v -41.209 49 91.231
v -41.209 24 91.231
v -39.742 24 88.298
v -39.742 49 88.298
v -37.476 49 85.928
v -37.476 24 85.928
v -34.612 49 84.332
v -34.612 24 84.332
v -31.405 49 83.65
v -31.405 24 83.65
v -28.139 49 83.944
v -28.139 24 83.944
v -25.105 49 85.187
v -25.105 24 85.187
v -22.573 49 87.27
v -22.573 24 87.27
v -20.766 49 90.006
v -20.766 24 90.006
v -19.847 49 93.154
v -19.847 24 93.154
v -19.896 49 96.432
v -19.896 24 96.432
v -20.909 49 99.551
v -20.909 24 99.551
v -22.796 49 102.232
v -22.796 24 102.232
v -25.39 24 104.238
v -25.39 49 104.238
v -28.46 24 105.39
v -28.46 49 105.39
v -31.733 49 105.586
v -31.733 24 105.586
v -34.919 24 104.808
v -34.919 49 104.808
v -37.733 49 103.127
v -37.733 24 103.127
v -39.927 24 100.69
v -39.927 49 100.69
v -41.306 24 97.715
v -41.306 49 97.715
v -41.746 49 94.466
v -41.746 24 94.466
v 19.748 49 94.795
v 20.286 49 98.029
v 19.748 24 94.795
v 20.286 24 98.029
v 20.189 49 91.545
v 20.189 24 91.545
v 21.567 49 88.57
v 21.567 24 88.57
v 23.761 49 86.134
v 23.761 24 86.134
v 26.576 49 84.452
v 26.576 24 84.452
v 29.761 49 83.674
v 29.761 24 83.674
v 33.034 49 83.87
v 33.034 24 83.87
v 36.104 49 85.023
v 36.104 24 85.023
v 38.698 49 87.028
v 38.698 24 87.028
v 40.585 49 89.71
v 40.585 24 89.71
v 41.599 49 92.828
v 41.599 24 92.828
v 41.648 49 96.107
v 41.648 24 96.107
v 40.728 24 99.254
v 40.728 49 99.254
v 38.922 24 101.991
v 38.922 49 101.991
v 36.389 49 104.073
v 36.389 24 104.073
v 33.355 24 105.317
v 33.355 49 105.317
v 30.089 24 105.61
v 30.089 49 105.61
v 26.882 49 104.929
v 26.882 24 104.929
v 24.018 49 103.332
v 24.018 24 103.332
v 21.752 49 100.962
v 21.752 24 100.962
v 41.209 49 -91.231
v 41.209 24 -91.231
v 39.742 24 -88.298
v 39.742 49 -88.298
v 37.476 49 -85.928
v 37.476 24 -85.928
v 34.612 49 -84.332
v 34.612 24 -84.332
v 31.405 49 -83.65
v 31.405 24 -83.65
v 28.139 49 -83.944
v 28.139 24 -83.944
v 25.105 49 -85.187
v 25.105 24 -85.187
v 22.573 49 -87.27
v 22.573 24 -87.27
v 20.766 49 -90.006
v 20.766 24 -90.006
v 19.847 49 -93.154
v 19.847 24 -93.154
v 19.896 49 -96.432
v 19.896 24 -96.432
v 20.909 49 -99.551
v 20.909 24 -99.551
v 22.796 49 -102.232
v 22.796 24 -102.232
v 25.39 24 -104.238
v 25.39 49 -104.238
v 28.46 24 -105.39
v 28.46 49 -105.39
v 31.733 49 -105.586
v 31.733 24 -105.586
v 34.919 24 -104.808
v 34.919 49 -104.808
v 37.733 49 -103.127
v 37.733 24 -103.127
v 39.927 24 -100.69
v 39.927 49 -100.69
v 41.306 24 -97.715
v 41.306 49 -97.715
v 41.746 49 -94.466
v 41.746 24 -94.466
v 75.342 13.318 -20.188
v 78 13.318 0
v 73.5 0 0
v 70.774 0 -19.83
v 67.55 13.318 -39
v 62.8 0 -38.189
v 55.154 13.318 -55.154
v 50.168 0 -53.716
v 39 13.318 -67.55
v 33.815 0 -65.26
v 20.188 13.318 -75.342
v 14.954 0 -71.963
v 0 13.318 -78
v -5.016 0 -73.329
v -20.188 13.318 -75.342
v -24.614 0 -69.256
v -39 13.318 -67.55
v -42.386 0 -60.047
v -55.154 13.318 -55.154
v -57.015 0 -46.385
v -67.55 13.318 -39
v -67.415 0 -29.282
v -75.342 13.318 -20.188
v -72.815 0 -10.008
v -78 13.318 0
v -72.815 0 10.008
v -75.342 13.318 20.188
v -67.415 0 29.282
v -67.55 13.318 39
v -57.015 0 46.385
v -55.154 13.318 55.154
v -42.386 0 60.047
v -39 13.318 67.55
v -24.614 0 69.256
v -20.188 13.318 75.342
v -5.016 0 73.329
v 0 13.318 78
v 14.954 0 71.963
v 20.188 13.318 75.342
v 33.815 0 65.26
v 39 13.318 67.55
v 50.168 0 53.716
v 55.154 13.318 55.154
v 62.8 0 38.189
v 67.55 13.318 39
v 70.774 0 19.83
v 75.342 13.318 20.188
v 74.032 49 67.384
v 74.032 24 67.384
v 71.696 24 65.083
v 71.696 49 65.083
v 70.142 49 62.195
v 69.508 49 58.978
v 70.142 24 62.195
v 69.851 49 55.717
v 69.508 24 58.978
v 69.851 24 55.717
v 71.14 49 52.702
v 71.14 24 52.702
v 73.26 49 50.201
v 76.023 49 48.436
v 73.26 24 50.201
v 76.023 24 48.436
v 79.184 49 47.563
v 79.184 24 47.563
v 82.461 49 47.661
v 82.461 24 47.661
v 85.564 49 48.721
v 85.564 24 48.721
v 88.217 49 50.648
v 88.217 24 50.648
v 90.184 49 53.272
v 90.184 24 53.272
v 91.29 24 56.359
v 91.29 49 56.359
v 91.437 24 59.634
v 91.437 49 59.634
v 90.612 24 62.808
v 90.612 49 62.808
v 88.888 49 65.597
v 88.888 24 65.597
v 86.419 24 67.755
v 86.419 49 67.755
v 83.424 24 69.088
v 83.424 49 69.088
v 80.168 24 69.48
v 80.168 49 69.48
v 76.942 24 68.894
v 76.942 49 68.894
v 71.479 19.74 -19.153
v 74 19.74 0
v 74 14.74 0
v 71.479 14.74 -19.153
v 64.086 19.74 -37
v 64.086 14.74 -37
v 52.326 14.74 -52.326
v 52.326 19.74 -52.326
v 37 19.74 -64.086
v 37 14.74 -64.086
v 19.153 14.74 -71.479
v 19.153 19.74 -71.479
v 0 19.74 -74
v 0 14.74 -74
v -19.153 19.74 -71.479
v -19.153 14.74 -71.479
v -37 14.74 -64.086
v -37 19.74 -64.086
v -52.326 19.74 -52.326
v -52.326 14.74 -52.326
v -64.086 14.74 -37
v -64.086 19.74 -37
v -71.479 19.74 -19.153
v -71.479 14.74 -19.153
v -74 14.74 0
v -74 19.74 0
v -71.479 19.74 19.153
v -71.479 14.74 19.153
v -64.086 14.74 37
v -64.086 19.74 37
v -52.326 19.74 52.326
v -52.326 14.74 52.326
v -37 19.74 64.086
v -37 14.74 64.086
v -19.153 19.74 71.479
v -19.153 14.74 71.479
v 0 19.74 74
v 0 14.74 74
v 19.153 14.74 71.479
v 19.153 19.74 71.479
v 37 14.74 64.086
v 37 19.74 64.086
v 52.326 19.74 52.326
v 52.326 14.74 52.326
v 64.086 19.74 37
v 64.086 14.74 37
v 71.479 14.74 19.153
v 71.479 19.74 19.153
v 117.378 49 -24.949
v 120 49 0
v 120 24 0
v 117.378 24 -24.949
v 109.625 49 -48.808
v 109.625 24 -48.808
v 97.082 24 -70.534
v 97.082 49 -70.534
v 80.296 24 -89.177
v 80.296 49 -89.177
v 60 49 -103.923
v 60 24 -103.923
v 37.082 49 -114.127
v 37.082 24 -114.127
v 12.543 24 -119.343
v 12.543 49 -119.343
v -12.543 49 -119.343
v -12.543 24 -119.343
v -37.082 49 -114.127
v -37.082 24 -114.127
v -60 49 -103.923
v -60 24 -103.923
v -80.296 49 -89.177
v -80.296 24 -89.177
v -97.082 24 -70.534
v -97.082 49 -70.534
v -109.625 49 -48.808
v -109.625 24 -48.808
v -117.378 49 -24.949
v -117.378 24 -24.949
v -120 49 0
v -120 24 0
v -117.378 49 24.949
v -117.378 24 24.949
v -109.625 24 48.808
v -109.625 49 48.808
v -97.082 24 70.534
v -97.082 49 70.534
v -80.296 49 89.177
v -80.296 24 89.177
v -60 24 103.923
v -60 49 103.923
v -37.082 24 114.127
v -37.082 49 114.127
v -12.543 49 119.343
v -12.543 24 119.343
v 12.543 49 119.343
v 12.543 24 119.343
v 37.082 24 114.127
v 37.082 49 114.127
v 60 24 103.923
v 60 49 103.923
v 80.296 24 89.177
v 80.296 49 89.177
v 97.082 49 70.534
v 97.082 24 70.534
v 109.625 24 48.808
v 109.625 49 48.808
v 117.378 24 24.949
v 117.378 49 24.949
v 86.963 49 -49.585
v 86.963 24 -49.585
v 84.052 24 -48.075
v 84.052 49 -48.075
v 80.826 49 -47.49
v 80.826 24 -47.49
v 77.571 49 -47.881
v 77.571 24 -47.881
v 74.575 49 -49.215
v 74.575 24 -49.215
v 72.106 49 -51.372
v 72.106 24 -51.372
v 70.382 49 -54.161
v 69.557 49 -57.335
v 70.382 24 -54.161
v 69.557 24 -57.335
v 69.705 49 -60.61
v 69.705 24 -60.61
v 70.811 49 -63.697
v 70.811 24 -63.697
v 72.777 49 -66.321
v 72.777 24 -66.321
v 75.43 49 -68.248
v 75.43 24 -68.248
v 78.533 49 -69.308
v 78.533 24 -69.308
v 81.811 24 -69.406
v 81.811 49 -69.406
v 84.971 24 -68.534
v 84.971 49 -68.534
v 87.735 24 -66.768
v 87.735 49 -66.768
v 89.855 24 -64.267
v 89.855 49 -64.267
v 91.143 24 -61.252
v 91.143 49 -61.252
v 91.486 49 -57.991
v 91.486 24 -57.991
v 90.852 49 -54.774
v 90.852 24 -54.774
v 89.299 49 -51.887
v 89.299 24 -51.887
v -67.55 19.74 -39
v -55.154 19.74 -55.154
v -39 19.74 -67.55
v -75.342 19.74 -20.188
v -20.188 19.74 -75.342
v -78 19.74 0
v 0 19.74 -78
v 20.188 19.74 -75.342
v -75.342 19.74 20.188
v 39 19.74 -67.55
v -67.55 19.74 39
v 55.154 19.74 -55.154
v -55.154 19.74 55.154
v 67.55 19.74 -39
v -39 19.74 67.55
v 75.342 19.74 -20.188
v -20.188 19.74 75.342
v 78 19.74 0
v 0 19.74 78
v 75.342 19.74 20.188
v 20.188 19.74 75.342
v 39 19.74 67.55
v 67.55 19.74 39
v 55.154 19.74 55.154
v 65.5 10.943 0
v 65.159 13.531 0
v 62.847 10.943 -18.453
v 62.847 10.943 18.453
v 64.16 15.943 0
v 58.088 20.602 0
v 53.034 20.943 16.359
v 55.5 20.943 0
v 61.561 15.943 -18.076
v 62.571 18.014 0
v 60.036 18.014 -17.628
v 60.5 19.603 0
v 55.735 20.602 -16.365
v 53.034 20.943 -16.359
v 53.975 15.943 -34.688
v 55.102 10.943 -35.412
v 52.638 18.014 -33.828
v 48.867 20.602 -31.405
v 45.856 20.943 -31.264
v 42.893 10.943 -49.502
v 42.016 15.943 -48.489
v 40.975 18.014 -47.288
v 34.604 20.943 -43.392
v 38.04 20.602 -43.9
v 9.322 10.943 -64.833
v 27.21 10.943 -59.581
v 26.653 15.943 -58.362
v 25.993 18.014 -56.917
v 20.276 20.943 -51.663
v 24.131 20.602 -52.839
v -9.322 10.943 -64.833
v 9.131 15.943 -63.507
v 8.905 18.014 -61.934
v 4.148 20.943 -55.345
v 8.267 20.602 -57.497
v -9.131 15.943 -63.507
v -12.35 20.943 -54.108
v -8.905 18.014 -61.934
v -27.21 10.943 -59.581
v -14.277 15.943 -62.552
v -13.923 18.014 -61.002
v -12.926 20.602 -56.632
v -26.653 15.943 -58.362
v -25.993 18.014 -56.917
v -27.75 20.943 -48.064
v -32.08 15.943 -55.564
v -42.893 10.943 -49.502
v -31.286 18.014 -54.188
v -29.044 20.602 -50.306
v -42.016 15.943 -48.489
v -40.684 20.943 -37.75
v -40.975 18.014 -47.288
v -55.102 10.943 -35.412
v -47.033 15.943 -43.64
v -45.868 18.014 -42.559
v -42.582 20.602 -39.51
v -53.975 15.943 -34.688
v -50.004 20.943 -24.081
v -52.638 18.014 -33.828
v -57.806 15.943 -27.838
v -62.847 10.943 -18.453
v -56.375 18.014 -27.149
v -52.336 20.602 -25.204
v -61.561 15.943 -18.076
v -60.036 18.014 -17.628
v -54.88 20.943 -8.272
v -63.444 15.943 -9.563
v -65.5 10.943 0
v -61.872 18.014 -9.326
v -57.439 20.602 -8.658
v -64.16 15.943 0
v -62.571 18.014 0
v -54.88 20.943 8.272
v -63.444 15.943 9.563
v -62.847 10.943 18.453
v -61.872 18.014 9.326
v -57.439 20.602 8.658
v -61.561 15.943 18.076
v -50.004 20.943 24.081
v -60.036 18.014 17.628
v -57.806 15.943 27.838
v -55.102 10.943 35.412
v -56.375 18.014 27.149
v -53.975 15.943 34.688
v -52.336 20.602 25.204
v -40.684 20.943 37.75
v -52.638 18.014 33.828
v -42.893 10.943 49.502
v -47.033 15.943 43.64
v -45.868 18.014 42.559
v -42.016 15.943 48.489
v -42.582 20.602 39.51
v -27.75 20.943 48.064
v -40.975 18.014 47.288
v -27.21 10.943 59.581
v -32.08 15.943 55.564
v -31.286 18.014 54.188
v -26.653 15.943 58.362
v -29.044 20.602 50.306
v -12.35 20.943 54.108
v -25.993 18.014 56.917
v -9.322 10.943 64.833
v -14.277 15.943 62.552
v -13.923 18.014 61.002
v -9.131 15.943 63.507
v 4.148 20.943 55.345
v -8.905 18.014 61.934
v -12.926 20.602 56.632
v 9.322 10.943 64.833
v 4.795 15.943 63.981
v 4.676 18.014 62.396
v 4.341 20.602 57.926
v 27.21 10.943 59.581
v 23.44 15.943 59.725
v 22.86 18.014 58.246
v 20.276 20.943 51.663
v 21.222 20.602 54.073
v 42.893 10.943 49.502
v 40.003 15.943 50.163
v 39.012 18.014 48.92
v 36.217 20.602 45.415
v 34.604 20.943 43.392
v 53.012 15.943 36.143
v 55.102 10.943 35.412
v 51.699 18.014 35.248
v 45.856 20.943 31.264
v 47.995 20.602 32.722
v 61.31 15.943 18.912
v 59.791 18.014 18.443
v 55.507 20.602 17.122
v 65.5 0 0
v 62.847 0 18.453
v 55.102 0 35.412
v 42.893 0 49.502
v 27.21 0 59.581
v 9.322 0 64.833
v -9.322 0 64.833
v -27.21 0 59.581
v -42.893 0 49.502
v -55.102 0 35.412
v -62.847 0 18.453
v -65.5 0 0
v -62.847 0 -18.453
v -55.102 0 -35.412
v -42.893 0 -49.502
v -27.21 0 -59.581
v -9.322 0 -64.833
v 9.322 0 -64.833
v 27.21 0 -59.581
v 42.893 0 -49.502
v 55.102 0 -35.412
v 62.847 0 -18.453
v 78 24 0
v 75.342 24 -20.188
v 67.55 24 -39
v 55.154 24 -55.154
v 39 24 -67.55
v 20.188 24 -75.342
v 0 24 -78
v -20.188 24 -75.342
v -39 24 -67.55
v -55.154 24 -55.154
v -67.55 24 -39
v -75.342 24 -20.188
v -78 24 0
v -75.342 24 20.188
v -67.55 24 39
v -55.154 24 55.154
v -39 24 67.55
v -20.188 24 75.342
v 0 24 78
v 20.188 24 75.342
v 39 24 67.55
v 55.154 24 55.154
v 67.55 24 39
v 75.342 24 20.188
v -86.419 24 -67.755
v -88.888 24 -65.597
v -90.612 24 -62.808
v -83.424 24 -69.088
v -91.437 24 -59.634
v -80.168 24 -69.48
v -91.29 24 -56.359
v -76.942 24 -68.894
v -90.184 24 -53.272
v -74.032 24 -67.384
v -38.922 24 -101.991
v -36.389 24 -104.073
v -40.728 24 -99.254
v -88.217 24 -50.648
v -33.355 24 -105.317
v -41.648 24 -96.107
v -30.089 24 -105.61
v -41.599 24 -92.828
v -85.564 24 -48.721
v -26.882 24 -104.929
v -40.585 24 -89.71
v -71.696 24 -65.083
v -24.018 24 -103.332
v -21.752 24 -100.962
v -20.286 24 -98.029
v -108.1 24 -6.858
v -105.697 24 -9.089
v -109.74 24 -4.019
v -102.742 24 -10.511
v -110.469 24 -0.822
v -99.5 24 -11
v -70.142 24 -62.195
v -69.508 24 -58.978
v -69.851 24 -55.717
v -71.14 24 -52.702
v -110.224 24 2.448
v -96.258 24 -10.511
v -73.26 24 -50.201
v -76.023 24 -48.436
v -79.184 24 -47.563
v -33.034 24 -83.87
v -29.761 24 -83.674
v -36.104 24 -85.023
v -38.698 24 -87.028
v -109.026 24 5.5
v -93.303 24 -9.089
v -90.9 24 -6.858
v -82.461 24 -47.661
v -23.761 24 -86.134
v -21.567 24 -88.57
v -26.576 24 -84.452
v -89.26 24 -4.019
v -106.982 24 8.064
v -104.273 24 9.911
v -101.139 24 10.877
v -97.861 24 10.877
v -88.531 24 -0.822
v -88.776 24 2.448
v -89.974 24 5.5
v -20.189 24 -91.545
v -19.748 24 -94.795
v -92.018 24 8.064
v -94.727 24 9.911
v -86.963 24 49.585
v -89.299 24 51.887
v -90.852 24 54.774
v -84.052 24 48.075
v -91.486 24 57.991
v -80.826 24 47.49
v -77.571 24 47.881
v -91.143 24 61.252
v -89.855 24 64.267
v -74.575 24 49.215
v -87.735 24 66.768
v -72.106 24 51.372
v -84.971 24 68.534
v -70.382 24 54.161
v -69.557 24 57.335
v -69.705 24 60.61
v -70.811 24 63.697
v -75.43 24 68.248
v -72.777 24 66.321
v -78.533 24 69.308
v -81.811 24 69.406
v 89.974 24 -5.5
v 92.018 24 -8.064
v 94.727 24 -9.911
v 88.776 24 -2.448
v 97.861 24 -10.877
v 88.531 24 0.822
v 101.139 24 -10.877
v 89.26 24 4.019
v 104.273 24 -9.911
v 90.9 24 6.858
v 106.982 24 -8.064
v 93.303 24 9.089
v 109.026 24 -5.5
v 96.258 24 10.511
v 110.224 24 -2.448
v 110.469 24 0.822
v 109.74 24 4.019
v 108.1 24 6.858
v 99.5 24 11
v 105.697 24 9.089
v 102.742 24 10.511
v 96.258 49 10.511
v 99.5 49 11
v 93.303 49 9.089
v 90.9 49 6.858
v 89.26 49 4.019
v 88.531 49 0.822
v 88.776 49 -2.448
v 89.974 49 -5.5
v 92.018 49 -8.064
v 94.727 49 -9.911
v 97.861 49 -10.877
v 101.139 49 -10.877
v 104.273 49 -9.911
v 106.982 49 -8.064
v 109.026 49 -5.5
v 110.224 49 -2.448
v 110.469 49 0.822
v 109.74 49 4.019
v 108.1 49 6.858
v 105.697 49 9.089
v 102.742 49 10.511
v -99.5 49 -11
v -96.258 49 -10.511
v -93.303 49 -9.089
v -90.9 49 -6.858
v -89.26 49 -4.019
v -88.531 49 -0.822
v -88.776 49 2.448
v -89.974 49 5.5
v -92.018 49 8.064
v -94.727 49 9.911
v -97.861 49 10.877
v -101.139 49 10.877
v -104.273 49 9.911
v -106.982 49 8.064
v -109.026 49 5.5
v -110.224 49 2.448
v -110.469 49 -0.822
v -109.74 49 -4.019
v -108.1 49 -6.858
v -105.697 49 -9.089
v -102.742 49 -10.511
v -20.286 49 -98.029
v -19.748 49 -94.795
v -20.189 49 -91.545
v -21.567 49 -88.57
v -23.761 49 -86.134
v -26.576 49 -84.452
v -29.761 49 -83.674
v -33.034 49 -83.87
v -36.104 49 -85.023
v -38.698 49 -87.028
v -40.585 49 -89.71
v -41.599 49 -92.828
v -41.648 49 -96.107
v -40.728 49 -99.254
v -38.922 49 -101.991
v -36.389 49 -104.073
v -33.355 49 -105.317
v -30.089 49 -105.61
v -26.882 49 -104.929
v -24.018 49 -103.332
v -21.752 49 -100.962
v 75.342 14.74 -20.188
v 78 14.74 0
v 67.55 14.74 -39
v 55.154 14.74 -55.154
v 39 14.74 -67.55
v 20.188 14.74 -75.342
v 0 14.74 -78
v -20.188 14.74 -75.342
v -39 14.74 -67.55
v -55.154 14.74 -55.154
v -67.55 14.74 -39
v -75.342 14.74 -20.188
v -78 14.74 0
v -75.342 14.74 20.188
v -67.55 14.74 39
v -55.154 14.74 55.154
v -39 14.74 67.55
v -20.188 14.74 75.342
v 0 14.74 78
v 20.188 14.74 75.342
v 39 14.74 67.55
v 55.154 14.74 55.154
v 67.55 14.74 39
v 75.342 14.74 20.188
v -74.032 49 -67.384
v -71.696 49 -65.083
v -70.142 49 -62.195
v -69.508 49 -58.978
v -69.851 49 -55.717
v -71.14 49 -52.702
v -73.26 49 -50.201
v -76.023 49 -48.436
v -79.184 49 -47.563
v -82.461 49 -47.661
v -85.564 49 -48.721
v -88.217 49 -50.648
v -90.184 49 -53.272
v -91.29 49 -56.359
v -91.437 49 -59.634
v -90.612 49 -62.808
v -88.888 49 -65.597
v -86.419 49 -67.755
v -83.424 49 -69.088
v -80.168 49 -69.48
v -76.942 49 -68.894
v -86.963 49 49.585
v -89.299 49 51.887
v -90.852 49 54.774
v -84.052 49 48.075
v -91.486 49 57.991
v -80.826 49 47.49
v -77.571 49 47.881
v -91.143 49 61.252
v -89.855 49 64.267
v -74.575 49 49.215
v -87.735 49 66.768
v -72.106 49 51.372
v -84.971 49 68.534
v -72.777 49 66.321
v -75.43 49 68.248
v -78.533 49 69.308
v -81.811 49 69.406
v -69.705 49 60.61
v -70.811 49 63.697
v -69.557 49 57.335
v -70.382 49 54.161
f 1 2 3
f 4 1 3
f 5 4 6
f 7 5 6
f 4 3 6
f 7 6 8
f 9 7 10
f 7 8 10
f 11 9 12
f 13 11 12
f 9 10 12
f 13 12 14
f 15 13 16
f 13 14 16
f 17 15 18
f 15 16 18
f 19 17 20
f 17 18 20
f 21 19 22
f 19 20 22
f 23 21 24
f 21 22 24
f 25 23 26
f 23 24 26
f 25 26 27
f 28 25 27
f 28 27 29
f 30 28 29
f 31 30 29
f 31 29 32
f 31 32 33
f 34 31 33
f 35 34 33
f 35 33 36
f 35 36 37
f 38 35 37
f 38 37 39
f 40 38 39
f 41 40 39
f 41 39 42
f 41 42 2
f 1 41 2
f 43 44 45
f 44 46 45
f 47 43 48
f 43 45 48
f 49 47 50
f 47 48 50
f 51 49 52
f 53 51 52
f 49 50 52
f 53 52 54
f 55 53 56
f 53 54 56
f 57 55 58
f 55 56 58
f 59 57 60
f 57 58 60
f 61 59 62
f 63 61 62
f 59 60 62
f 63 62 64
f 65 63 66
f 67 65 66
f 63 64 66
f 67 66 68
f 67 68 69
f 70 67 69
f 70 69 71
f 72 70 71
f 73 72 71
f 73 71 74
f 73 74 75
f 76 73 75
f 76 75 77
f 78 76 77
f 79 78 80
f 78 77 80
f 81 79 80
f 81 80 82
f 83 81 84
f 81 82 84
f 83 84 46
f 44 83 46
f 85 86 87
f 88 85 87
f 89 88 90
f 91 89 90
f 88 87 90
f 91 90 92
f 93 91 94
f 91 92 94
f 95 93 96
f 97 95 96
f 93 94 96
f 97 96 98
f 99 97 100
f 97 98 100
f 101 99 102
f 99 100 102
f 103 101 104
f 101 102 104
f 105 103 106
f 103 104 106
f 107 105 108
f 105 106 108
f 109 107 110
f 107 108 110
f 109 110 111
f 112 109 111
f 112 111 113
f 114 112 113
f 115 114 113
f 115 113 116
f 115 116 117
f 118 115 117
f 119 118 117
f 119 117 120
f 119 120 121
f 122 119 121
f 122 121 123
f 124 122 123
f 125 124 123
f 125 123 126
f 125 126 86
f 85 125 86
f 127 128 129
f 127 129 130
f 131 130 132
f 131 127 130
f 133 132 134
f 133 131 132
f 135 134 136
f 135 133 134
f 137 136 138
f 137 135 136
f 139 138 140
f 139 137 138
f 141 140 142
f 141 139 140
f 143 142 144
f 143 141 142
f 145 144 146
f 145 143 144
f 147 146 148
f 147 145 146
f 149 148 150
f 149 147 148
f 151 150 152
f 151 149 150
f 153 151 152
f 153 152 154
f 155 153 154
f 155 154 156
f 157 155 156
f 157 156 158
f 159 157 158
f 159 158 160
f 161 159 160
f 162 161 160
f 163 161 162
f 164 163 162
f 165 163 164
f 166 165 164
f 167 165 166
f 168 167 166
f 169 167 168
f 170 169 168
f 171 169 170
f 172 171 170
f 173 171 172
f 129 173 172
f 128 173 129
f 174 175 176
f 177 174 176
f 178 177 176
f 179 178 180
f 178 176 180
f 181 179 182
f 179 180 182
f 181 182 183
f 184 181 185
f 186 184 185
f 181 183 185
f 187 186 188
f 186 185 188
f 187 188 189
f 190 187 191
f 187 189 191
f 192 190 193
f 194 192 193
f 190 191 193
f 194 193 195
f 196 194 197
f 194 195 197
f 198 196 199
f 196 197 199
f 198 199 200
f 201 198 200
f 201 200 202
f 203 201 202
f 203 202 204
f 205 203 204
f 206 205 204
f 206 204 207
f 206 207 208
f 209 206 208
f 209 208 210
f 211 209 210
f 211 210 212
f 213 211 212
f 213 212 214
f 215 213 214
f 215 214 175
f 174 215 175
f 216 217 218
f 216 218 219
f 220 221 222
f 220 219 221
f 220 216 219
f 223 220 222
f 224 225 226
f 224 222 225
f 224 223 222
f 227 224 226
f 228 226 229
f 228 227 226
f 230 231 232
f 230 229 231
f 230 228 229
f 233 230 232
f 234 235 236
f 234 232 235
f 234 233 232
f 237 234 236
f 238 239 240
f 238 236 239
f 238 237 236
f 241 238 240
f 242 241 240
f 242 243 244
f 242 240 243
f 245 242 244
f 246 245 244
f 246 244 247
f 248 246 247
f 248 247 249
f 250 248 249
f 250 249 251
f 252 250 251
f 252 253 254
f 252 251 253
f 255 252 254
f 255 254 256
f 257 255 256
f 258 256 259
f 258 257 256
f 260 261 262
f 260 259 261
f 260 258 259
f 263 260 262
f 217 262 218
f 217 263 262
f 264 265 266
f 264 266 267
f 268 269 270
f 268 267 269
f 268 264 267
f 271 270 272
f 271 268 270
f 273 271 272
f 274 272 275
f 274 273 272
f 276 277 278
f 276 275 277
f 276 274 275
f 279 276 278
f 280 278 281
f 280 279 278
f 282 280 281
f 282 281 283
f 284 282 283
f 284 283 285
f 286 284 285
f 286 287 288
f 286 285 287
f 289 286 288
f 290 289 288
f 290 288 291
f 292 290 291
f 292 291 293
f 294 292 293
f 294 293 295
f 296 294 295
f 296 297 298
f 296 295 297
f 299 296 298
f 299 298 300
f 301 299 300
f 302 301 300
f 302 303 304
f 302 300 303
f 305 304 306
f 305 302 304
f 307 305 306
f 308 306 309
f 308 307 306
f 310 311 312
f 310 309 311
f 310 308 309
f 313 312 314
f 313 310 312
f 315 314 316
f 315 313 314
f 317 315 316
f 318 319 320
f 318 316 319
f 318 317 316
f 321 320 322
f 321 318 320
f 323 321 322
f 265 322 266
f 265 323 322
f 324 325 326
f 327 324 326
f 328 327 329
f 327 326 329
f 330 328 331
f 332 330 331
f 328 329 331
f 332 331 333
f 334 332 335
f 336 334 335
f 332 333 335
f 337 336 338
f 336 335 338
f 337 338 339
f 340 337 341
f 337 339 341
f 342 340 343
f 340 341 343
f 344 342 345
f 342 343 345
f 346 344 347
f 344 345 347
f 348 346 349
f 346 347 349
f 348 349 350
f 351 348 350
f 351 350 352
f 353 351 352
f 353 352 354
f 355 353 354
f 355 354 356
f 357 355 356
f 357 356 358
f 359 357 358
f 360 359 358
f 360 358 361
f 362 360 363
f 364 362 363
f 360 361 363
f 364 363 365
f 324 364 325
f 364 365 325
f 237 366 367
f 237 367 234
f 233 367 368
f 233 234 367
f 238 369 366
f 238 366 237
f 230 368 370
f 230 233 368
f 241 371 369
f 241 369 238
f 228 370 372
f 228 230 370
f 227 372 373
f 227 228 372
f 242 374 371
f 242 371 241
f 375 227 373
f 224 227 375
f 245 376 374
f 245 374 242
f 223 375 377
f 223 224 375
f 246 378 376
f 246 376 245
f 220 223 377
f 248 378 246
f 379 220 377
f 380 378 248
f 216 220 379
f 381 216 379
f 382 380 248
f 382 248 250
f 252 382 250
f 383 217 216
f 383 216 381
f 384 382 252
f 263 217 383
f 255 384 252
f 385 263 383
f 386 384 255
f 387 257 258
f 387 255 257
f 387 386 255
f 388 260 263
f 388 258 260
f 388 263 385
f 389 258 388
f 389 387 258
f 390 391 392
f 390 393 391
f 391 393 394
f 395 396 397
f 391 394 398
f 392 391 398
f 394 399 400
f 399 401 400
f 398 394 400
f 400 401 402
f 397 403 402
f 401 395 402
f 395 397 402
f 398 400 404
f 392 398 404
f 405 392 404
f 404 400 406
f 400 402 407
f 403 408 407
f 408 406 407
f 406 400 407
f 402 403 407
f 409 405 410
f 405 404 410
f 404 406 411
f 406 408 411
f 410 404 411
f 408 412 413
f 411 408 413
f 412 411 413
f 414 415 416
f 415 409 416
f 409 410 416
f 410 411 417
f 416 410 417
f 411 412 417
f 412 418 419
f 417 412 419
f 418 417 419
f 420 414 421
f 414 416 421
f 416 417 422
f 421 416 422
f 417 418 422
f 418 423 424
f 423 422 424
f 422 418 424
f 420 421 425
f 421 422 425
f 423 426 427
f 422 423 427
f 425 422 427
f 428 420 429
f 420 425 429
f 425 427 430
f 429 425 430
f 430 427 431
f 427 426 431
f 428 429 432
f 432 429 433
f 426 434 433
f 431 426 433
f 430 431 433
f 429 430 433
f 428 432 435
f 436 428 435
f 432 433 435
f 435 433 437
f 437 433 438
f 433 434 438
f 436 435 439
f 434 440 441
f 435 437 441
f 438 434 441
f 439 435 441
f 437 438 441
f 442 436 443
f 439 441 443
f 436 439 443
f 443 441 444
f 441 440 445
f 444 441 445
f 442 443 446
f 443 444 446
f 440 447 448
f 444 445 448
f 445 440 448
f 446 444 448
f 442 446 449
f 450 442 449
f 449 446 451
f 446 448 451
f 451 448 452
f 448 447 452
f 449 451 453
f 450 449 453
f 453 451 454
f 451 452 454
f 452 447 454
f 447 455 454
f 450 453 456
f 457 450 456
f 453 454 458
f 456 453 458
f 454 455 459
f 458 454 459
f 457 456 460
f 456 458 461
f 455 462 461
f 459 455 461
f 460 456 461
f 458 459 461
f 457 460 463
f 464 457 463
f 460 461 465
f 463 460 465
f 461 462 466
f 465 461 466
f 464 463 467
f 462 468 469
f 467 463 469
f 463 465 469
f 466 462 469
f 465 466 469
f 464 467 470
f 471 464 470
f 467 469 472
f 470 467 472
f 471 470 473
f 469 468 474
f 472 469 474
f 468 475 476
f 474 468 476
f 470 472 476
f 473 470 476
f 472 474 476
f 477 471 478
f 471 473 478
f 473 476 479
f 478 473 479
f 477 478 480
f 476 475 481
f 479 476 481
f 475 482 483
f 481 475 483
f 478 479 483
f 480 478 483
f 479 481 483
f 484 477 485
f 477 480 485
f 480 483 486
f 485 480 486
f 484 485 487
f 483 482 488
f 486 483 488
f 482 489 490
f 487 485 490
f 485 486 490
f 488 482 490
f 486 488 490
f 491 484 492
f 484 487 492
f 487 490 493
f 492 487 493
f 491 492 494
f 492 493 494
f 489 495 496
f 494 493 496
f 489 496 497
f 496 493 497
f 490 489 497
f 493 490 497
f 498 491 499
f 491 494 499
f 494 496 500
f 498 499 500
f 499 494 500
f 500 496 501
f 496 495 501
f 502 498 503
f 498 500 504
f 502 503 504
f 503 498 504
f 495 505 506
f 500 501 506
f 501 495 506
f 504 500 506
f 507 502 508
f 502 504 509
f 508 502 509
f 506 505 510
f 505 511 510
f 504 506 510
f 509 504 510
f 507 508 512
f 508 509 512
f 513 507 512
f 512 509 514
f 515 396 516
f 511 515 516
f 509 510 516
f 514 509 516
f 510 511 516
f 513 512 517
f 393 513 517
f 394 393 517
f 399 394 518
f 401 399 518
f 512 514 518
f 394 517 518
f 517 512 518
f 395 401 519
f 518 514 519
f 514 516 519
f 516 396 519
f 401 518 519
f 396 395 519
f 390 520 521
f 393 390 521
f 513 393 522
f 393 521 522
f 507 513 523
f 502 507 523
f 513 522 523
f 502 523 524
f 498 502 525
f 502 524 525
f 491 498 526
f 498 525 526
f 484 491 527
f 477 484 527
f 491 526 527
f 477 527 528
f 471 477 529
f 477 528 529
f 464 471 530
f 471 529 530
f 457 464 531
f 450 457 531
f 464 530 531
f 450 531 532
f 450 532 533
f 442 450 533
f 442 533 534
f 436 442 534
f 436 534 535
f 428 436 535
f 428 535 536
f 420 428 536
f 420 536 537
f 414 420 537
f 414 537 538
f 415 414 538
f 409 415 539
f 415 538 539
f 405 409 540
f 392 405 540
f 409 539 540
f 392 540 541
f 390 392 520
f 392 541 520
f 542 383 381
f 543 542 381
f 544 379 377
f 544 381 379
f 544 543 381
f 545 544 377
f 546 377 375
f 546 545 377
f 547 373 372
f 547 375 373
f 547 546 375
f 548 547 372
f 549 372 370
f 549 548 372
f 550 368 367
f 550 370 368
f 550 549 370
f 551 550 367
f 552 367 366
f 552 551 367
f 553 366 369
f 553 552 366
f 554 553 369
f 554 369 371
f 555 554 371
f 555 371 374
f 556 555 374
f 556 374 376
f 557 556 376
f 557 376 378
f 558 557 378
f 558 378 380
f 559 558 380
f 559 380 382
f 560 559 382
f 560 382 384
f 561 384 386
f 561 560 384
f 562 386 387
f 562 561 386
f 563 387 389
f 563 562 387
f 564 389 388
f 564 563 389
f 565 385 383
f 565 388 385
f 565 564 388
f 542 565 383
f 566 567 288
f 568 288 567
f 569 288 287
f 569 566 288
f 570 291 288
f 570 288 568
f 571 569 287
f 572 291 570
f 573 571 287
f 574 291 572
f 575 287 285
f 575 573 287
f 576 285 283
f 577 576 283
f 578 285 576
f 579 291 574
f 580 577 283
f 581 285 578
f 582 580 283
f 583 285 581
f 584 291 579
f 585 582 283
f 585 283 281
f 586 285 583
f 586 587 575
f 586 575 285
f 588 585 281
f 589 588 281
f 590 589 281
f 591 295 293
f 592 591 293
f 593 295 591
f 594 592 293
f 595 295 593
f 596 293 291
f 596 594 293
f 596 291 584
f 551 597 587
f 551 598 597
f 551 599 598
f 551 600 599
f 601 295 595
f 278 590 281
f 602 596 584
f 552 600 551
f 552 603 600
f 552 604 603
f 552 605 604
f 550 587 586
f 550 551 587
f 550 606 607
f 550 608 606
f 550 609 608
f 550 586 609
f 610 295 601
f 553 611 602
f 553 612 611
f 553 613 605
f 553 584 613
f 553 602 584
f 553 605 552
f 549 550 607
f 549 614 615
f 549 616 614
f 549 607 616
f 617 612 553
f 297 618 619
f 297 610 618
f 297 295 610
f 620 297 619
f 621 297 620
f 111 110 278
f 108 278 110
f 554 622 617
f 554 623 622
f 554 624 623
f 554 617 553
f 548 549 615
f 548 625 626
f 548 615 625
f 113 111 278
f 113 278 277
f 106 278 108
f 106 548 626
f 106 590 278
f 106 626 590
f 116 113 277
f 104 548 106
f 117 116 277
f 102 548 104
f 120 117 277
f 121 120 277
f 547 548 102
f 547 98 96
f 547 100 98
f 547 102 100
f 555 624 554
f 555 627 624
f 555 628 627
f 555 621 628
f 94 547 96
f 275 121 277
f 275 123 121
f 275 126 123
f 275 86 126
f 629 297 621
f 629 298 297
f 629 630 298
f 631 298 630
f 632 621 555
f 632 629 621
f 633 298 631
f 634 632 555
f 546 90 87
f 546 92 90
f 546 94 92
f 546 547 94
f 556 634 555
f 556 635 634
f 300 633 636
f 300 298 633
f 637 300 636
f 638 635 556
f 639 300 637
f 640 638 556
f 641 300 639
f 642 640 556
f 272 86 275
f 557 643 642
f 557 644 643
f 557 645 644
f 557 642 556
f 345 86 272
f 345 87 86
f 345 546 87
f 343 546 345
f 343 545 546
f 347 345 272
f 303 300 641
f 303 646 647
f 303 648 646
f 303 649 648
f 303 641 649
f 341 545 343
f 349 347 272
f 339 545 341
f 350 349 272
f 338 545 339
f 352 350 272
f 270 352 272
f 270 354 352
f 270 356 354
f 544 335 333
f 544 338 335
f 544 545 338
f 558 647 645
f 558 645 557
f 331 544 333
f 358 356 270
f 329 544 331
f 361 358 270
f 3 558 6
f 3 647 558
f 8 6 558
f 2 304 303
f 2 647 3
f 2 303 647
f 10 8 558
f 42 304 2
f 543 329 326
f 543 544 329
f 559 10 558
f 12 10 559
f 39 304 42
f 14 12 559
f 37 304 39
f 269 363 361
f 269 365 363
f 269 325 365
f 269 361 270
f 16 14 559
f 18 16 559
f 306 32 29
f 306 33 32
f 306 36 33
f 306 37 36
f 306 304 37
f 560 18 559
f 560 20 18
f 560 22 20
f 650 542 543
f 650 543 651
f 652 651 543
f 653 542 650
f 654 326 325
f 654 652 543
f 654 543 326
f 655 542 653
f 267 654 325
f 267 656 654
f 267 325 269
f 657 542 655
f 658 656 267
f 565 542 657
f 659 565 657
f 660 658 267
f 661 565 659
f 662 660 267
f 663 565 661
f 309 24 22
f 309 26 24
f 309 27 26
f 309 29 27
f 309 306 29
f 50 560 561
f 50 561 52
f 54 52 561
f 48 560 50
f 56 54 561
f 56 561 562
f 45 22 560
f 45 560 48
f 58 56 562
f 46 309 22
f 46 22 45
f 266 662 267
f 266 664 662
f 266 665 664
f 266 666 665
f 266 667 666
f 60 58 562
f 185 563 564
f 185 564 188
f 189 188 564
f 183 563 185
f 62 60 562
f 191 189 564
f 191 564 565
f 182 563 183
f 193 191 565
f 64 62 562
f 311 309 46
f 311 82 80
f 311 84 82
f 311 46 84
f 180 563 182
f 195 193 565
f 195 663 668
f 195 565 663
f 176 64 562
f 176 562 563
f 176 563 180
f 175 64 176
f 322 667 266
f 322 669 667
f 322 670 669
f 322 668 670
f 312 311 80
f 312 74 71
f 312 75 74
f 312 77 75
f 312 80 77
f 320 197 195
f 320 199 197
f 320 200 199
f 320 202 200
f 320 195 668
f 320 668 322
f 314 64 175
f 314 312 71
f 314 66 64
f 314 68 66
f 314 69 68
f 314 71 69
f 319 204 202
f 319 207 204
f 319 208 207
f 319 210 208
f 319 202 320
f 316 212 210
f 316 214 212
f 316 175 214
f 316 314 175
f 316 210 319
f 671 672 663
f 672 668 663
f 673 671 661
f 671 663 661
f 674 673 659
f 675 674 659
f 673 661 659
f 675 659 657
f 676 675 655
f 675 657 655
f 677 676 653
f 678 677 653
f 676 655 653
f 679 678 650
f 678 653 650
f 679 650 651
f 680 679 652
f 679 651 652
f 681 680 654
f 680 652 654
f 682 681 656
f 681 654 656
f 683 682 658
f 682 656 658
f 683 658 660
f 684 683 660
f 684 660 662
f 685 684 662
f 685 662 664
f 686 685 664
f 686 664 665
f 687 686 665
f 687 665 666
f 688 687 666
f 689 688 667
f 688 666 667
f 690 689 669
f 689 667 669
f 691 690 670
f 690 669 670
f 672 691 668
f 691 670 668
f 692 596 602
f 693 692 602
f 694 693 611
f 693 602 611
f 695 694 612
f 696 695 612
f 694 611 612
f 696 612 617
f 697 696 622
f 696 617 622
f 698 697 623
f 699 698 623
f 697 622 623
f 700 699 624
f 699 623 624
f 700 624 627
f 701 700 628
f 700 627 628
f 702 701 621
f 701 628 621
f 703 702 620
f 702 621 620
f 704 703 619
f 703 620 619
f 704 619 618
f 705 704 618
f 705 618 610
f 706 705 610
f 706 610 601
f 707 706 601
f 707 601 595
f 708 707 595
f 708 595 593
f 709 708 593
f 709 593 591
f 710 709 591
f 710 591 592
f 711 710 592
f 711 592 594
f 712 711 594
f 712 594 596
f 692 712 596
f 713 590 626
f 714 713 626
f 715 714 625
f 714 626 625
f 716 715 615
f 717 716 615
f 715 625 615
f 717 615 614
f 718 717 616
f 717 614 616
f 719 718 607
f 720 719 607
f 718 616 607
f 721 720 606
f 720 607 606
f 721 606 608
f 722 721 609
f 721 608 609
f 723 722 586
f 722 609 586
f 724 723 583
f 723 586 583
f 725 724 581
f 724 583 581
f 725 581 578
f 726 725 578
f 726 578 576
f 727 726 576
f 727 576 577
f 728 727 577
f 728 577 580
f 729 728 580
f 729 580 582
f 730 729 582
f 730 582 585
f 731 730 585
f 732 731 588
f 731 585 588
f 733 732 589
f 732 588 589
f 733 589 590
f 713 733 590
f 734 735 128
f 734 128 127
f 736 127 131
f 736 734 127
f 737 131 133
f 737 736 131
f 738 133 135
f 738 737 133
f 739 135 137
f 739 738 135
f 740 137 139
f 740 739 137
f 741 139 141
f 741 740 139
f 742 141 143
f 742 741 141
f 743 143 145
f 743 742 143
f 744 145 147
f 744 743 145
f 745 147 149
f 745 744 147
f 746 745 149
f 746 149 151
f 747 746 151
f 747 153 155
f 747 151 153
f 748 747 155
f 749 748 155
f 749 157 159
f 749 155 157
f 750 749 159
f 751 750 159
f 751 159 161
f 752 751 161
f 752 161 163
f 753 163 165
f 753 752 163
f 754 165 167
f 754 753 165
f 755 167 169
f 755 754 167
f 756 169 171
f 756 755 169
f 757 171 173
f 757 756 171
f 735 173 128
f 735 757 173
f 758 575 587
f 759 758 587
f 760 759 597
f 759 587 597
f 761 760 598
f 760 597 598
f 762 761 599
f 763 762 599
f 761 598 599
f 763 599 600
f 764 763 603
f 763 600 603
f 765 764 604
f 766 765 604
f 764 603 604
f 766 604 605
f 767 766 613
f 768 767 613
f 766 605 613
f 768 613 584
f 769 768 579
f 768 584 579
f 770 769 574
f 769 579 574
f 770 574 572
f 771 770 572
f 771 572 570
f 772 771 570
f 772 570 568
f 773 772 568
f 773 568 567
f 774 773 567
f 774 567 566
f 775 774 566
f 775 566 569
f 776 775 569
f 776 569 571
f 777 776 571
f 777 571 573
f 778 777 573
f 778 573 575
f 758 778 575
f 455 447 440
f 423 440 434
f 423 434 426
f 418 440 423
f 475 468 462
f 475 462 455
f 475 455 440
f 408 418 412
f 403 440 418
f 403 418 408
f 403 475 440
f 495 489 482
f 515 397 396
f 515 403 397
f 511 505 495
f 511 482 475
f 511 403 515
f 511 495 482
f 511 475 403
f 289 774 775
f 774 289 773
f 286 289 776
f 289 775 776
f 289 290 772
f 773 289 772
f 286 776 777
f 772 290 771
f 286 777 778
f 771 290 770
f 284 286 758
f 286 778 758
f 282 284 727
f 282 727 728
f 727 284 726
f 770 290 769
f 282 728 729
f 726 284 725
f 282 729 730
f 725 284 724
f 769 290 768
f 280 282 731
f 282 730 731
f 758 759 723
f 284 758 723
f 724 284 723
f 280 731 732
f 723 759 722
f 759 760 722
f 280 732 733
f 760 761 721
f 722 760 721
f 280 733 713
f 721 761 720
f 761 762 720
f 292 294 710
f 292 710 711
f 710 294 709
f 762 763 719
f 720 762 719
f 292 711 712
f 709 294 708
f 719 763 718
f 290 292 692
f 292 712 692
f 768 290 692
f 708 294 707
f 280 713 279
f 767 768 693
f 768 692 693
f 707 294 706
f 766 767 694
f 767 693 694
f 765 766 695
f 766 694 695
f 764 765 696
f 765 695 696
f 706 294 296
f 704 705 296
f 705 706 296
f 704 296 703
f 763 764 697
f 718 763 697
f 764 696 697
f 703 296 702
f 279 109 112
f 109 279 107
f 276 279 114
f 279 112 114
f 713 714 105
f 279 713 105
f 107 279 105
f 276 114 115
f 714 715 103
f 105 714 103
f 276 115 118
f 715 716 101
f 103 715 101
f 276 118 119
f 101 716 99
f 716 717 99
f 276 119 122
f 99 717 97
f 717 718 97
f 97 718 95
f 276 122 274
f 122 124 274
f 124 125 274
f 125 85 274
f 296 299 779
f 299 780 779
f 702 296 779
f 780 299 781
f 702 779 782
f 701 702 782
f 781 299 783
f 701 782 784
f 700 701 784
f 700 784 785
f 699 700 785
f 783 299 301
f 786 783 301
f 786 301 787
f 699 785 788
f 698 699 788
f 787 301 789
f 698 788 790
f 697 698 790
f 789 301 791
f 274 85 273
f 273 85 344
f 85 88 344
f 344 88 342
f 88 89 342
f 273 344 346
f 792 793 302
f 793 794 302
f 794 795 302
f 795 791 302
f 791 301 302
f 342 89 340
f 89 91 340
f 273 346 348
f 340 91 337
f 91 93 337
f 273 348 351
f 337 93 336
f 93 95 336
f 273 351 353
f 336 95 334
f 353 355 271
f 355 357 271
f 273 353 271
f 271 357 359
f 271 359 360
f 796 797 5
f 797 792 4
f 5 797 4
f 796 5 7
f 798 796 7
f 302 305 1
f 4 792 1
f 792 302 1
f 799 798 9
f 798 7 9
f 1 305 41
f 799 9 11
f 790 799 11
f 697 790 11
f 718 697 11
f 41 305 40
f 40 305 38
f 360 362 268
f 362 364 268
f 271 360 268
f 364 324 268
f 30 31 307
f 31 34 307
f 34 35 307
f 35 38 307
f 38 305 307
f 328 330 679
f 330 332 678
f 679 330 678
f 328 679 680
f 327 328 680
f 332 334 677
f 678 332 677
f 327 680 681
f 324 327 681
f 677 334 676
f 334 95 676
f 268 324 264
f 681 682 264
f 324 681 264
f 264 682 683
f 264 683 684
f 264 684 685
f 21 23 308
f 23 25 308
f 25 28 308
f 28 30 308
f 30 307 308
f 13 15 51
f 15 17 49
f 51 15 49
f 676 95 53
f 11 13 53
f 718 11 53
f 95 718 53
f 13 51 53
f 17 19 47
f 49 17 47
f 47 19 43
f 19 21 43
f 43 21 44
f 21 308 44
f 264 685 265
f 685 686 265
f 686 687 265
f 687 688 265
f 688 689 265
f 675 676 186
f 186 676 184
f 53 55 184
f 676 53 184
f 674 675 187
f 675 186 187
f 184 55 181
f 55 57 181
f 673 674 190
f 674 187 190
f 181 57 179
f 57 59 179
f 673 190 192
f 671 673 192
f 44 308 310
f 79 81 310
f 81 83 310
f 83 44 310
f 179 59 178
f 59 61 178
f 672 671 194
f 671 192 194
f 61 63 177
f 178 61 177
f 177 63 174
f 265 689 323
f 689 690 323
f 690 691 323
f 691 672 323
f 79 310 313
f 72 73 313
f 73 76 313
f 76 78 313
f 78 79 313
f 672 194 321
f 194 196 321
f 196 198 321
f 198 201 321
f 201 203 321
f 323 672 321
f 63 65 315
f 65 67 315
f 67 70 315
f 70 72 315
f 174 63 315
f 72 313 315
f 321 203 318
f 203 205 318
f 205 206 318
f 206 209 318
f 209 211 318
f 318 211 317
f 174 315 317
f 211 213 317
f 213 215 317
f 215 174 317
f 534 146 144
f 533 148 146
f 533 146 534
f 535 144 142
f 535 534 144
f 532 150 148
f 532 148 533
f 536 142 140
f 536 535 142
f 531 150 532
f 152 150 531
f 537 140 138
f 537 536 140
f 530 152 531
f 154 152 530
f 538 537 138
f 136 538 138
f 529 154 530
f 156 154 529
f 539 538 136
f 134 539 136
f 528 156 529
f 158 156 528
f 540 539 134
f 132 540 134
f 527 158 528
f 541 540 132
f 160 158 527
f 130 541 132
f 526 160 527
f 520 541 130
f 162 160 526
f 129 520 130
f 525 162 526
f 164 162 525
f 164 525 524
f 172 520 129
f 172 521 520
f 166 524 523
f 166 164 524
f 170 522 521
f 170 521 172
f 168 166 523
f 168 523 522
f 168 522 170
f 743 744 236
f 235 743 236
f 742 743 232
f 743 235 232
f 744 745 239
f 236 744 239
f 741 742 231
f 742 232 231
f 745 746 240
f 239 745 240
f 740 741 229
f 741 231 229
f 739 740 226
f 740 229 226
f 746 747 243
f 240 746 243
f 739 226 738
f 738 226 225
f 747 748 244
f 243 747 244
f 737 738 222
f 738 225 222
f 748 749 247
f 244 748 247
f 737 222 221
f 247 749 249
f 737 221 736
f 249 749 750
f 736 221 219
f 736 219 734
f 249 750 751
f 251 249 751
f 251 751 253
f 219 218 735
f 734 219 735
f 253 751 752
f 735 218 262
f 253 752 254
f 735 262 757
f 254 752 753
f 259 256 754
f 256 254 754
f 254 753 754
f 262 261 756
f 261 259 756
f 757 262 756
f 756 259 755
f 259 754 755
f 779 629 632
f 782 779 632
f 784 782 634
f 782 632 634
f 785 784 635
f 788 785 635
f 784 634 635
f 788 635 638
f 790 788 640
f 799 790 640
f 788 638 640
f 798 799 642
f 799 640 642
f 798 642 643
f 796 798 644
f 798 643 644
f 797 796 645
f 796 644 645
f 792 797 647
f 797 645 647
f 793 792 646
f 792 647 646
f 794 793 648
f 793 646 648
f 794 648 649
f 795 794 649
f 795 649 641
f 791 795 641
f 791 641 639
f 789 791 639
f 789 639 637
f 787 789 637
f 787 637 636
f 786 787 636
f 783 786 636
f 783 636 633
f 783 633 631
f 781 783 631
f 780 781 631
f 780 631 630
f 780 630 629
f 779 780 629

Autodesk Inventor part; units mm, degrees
ref_plane "YZ Plane" through (0, 0, 0) normal (1, 0, 0) x (0, 1, 0)
ref_plane "XZ Plane" through (0, 0, 0) normal (0, 1, 0) x (-1, 0, 0)
ref_plane "XY Plane" through (0, 0, 0) normal (0, 0, 1) x (1, 0, 0)
sketch "Эскиз1" plane through (0, 0, 0) normal (0, 0, 1) x (1, 0, 0)
  line L0 (0, 0) -> (78, 0)
  line L1 (78, 0) -> (78, 24)
  line L2 (78, 24) -> (120, 24)
  line L3 (120, 24) -> (120, 49)
  line L4 (120, 49) -> (0, 49)
  line L5 (65.5, 20.9431) -> (0, 20.9431)
  line L6 (0, 49) -> (0, 20.9431)
  line L7 (65.5, 20.9431) -> (65.5, 0)
  line L8 (65.5, 0) -> (73.5, 0)
  line L9 (73.5, 0) -> (78, 13.3185)
  line L10 (78, 14.7395) -> (74, 14.7395)
  line L11 (74, 14.7395) -> (74, 19.7395)
  line L12 (74, 19.7395) -> (78, 19.7395)
  dimension "d0" = 78
  dimension "d1" = 24
  dimension "d2" = 42
  dimension "d3" = 25
  dimension "d18" = 65.5
  dimension "d19" = 8
  dimension "d21" = 4
  dimension "d22" = 5
revolve "Вращение1" add sketch "Эскиз1" angle 360 about axis through (0, 49, 0) along (0, -1, 0) contours L7 L5 L6 L4 L3 L2 L1 L12 L11 L10 L9 L0
sketch "Эскиз2" plane through (0, 49, 0) normal (0, 1, 0) x (1, 0, 0)
  circle A0 centre (0, 0) radius 120 projected
  line L0 (120, 0) -> (99.5, 0)
  point P0 (0, 0)
  dimension "d7" = 20.5
hole "Отверстие1" at (99.5, 49, 0) direction (0, -1, 0) diameter 22 end through all
pattern_circular "Круговой массив1" count 10 over 360 about axis through (0, 10.4715, 0) along (0, -1, 0) of "Отверстие1"
fillet "Сопряжение1" radius 10 1 edges at (-65.5, 20.9431, 0)
properties part number "Крышка стакана" material "Чугун, серый"
